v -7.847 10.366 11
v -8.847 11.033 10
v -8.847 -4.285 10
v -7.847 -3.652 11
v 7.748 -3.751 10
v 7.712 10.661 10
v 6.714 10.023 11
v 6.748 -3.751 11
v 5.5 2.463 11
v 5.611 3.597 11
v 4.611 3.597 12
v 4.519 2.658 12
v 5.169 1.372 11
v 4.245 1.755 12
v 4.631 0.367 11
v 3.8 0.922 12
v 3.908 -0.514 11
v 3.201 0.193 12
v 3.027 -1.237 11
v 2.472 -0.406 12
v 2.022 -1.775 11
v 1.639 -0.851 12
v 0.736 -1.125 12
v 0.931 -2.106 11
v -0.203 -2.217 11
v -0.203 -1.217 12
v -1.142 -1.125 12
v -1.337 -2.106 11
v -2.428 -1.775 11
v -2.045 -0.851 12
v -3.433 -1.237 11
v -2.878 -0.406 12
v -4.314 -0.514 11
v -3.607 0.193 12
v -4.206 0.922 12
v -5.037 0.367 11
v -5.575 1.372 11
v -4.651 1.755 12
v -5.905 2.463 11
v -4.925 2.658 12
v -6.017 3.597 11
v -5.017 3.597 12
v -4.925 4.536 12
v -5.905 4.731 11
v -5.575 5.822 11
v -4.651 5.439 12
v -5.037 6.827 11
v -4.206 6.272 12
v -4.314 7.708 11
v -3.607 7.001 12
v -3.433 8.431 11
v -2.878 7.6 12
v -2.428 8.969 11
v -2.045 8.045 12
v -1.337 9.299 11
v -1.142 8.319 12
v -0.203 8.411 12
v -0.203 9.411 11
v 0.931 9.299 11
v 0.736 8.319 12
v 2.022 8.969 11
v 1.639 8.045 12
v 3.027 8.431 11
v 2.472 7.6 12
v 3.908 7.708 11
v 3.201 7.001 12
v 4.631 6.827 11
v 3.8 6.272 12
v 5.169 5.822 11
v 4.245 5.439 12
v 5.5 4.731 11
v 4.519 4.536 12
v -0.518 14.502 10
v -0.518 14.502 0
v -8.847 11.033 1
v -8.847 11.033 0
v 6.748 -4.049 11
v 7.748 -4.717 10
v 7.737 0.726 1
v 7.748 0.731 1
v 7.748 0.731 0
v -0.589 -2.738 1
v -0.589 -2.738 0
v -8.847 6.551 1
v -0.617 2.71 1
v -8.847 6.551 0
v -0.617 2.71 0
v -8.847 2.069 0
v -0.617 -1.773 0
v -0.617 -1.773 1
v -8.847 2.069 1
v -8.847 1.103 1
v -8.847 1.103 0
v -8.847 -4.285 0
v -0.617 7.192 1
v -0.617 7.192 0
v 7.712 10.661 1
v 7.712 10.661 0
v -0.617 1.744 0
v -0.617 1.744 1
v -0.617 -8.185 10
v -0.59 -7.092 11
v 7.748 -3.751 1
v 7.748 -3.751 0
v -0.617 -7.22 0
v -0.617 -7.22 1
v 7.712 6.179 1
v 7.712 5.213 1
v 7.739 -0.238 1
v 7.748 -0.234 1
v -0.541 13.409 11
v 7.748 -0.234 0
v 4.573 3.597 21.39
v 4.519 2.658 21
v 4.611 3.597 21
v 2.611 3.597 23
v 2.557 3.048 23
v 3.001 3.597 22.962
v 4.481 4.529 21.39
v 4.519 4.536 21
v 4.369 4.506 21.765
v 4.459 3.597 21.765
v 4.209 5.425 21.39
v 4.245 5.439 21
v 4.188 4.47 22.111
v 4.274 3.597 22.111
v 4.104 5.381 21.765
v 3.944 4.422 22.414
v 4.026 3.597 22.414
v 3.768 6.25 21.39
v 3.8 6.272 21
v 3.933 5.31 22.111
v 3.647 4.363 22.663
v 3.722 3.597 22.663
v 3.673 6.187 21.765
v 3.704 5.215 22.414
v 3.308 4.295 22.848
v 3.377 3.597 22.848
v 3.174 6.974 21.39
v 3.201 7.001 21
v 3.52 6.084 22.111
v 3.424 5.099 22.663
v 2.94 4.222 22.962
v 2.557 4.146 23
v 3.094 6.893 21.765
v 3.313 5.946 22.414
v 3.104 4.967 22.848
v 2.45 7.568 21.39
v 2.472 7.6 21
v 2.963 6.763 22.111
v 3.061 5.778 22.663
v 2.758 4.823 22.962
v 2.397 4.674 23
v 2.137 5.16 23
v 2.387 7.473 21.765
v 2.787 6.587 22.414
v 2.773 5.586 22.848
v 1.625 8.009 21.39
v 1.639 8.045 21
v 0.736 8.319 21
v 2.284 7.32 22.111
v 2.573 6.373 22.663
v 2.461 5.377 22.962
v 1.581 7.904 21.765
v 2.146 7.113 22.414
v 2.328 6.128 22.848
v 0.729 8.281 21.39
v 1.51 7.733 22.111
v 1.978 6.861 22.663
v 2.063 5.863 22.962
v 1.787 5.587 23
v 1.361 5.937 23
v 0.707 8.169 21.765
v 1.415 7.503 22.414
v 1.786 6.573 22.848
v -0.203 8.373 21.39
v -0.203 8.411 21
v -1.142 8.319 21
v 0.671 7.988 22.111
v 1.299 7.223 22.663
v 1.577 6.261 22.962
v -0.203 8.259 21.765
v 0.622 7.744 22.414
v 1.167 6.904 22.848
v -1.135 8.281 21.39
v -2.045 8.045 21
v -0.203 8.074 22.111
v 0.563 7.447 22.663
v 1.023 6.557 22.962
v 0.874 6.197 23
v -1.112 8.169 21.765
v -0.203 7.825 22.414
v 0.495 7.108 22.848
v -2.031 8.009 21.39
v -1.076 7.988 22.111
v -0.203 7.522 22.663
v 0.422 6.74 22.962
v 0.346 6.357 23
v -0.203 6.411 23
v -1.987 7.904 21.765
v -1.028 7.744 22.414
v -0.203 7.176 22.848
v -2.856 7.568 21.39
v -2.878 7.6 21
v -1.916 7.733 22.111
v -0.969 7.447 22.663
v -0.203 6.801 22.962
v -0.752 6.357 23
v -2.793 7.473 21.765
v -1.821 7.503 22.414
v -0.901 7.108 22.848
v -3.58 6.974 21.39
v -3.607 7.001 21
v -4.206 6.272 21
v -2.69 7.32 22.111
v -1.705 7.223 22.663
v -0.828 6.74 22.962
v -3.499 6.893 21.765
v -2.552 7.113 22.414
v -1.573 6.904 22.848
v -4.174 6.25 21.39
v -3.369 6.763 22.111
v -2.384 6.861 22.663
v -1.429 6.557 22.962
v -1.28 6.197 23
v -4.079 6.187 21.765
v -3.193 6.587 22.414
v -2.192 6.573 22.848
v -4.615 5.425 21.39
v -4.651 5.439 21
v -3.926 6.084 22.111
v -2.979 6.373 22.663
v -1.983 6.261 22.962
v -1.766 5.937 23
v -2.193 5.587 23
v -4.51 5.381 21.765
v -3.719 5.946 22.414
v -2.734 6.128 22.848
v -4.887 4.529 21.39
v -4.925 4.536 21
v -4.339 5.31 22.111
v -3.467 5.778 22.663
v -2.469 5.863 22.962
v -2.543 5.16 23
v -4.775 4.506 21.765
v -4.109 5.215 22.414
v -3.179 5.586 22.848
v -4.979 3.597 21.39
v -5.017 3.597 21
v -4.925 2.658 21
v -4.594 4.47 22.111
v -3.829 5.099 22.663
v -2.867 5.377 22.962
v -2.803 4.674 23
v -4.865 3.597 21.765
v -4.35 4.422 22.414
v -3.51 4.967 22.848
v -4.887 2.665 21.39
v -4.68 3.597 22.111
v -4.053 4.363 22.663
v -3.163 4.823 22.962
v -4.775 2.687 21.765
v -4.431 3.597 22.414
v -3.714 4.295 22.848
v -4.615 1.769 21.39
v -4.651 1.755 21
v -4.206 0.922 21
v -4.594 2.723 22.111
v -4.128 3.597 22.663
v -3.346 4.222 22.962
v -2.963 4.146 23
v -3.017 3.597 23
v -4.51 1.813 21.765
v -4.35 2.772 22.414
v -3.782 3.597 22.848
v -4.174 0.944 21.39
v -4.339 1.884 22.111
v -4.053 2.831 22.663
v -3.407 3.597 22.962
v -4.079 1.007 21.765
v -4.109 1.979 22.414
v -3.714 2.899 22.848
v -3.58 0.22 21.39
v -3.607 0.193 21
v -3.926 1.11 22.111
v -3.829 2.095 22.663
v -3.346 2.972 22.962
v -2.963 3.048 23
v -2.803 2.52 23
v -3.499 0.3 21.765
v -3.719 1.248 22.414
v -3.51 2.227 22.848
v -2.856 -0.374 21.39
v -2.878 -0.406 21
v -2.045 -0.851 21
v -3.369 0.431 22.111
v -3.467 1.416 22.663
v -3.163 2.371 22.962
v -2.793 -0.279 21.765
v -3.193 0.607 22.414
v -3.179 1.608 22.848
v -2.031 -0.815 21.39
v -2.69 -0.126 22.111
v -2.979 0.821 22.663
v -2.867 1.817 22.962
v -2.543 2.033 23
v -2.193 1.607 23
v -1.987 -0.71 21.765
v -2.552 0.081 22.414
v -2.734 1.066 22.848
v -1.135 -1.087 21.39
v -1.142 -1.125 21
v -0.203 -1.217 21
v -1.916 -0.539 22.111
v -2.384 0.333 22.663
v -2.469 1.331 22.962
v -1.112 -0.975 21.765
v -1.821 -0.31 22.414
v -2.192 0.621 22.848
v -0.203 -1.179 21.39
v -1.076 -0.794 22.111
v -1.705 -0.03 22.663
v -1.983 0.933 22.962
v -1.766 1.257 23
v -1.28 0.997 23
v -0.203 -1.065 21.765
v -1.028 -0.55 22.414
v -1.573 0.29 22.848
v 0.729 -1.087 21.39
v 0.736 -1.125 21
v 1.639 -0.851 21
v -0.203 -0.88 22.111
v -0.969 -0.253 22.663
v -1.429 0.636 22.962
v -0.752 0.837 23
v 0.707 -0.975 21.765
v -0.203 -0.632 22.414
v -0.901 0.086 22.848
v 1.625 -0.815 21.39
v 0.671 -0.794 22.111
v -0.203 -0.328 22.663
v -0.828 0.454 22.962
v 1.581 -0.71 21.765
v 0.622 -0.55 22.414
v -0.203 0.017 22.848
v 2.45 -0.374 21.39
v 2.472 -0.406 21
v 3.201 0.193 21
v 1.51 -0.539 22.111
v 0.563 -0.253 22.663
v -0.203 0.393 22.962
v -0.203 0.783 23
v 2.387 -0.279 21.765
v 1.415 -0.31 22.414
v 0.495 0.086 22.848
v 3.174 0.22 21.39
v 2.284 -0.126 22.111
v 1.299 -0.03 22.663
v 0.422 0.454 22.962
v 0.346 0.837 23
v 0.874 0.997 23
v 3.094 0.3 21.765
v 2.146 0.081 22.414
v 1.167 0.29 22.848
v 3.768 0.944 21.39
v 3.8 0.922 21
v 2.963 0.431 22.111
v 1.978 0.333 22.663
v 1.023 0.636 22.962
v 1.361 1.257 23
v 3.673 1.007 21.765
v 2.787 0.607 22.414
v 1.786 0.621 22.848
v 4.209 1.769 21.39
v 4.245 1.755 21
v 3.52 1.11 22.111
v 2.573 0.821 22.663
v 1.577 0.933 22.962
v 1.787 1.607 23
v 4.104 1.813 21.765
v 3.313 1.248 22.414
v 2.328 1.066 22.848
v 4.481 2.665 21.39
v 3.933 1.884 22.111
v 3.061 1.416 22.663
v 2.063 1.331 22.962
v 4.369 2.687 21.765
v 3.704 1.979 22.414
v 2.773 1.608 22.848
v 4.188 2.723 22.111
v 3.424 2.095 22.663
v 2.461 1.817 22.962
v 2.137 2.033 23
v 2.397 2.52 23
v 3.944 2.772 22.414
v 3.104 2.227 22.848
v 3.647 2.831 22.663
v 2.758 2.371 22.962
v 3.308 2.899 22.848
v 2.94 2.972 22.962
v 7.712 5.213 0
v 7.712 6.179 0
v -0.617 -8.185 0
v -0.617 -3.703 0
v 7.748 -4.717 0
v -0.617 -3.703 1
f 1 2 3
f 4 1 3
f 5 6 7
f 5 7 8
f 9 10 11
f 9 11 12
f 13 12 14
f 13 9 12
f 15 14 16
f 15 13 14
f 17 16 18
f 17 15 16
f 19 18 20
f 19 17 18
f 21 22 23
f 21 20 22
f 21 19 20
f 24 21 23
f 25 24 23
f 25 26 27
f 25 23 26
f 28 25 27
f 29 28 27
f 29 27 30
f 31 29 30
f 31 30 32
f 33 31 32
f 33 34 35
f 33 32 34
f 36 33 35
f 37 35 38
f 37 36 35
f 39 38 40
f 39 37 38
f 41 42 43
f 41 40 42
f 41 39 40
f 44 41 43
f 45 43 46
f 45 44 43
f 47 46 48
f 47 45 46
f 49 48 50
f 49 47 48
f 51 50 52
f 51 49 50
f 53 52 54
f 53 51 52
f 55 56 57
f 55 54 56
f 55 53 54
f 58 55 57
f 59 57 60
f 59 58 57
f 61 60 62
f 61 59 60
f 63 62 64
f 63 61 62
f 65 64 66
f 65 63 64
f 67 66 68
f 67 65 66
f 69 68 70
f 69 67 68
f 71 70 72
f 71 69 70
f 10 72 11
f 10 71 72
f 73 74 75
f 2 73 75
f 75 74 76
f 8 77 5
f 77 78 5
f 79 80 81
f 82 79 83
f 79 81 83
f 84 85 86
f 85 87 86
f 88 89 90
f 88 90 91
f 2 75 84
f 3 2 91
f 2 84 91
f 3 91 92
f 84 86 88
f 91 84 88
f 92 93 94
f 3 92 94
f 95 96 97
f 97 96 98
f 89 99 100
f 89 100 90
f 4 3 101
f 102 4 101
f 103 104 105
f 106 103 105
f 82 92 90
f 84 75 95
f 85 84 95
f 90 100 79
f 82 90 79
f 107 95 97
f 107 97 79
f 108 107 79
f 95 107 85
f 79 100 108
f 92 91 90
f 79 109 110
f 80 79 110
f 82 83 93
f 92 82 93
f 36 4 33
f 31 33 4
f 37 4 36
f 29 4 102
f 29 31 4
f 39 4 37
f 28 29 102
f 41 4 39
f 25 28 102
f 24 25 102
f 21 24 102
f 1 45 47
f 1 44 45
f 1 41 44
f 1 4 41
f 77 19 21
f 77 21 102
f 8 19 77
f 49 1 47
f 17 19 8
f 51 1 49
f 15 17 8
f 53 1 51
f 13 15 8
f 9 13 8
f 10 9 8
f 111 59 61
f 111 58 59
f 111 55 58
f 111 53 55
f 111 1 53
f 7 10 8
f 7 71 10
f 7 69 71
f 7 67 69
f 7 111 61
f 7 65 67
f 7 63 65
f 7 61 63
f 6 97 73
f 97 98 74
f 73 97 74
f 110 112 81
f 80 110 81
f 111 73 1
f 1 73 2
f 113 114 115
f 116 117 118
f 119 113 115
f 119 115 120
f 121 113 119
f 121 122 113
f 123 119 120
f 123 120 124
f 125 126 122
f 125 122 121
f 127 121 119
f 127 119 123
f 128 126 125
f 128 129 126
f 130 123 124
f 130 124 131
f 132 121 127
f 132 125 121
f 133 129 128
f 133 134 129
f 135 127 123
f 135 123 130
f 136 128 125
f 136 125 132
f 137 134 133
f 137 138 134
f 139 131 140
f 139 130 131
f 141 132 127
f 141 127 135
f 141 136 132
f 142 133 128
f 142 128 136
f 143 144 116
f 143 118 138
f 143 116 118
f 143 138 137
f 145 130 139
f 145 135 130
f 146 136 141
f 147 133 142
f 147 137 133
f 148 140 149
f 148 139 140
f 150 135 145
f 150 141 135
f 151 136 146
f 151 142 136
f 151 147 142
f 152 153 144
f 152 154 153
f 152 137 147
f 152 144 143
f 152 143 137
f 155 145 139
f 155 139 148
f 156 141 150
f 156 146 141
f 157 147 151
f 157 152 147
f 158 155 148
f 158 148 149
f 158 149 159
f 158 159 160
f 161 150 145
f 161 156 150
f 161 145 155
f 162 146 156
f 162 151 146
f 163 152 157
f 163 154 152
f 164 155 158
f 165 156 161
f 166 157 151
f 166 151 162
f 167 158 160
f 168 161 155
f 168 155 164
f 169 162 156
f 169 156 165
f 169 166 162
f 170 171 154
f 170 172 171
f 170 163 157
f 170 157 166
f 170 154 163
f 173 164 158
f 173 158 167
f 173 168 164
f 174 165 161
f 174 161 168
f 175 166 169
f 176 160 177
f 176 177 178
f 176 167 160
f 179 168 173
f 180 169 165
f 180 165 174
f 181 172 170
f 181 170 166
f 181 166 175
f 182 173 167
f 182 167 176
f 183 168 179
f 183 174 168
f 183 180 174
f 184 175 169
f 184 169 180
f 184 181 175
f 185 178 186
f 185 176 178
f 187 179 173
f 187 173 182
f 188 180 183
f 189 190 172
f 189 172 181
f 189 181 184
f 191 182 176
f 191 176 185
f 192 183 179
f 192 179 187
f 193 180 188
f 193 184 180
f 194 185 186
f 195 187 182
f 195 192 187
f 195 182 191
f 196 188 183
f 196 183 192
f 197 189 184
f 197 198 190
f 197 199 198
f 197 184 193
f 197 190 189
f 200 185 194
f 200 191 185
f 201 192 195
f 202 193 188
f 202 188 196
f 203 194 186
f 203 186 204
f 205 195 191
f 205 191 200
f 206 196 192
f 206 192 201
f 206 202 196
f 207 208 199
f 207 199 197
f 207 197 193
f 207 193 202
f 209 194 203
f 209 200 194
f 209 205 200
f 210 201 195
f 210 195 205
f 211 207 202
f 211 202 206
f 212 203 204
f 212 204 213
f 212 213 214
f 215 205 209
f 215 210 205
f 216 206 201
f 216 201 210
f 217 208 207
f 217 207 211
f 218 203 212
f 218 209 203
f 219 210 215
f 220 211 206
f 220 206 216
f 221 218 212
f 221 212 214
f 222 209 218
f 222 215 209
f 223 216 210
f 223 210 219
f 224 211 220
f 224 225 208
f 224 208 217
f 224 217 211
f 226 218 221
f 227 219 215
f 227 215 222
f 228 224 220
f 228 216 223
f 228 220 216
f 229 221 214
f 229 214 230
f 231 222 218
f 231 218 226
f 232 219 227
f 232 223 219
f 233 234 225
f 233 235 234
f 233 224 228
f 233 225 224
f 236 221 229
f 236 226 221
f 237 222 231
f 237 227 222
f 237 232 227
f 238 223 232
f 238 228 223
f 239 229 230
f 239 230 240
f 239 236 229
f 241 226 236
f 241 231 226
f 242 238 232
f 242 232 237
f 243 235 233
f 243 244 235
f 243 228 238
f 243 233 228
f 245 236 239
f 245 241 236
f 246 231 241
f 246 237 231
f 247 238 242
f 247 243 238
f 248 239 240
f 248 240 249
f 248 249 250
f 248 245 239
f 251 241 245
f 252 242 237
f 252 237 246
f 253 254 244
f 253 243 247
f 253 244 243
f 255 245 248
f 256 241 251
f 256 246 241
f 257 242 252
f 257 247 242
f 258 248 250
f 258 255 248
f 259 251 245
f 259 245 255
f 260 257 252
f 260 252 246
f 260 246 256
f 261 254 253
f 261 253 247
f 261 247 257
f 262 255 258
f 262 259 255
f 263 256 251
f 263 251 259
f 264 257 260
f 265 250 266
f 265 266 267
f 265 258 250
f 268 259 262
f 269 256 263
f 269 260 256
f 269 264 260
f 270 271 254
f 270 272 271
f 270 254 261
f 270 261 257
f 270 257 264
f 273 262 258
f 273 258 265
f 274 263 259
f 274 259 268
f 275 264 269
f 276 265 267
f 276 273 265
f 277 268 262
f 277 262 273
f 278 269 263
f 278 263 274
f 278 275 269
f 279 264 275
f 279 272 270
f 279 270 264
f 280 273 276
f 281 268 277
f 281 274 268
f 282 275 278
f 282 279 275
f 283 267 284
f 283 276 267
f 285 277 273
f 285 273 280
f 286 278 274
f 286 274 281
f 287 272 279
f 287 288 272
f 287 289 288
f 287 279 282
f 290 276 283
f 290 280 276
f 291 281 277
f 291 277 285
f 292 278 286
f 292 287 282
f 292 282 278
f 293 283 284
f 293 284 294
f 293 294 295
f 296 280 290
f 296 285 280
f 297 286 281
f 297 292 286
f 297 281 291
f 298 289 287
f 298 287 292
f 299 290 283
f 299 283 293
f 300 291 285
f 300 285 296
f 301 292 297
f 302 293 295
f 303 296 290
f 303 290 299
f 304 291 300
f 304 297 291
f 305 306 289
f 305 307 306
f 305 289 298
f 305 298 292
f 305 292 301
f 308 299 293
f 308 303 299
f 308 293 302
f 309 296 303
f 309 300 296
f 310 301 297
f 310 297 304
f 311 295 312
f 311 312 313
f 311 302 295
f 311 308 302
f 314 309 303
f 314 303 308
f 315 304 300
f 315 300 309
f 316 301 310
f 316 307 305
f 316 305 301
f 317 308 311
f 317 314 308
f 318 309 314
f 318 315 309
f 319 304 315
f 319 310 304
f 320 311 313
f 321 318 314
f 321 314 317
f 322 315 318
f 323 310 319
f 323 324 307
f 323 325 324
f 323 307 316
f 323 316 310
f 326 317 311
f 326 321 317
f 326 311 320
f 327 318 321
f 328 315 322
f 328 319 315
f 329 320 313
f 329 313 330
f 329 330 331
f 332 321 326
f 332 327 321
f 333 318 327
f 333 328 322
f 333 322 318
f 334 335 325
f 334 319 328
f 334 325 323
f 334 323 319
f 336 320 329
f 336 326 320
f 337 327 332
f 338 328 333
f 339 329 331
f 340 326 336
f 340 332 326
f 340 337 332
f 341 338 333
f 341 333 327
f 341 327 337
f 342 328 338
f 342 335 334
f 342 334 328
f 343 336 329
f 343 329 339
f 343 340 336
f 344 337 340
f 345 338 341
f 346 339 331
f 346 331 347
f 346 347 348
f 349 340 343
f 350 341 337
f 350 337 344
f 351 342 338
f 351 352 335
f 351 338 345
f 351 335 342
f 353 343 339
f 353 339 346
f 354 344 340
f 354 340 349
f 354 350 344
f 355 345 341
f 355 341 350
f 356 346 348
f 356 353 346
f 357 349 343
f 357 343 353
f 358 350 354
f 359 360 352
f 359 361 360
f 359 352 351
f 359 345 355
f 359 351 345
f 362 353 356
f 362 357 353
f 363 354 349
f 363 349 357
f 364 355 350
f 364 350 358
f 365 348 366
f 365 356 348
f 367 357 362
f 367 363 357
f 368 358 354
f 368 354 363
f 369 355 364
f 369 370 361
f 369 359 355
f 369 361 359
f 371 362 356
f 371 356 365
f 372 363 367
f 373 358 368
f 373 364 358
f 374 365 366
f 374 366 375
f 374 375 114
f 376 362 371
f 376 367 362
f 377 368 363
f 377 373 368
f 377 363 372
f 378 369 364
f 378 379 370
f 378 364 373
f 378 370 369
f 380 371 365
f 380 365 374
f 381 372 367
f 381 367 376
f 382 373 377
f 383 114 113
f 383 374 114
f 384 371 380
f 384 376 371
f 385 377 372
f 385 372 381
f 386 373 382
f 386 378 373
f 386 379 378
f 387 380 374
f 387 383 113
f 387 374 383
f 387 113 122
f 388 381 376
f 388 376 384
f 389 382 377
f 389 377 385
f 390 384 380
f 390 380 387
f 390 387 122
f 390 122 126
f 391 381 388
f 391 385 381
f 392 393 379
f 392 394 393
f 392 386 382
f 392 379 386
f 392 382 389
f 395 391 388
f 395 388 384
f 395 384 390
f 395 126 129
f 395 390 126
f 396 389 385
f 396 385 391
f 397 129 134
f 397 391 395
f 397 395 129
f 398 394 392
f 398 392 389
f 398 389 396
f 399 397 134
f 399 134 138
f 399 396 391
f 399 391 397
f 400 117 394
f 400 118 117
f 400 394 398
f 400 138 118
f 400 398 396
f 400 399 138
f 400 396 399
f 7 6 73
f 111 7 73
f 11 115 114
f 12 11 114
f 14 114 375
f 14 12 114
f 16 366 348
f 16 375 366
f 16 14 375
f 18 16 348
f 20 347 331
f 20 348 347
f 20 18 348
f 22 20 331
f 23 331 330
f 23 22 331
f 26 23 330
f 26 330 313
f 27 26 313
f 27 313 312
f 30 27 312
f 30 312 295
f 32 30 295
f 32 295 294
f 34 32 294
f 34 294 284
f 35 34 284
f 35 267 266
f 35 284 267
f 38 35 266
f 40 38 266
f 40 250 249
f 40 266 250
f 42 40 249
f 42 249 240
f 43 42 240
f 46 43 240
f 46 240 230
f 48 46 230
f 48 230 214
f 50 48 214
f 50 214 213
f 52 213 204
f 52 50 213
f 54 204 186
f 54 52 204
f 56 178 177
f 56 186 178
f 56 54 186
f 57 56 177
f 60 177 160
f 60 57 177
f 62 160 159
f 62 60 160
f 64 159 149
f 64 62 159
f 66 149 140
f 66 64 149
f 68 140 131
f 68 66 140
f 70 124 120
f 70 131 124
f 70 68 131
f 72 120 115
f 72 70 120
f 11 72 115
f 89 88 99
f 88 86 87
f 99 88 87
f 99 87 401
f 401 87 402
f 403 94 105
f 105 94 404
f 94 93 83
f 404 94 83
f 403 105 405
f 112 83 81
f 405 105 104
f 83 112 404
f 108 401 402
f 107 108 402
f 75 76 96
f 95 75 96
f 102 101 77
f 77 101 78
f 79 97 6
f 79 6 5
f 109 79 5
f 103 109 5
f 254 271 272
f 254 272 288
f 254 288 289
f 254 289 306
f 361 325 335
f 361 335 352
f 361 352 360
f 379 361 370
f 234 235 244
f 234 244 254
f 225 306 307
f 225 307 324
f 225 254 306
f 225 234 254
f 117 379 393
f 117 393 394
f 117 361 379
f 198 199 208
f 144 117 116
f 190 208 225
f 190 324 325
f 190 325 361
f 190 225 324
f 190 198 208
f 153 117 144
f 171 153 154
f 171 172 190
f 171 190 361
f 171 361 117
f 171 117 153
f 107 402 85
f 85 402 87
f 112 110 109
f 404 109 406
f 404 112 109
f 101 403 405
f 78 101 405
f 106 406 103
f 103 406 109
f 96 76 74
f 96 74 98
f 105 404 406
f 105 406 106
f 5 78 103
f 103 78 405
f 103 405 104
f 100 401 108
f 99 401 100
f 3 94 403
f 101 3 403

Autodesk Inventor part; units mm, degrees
ref_plane "YZ Plane" through (0, 0, 0) normal (1, 0, 0) x (0, 1, 0)
ref_plane "XZ Plane" through (0, 0, 0) normal (0, 1, 0) x (-1, 0, 0)
ref_plane "XY Plane" through (0, 0, 0) normal (0, 0, 1) x (1, 0, 0)
sketch "Sketch1" plane through (0, 0, 0) normal (0, 0, 1) x (1, 0, 0)
  line L0 (7.712, 5.2132) -> (7.712, 6.1786)
  line L1 (7.712, 5.2132) -> (-0.617, 1.7442)
  line L2 (7.712, 6.1786) -> (-0.617, 2.7096)
  line L3 (-0.617, 7.1917) -> (7.712, 10.6607)
  line L4 (7.712, 10.6607) -> (-0.5182, 14.502)
  line L5 (-8.8472, 2.0687) -> (-8.8472, 6.5508)
  line L6 (-8.8472, 11.033) -> (-0.617, 7.1917)
  line L7 (-0.5182, 14.502) -> (-8.8472, 11.033)
  line L8 (-0.617, 2.7096) -> (-8.8472, 6.5508)
  line L9 (7.748, -0.2344) -> (7.748, 0.731)
  line L10 (-0.617, 1.7442) -> (-0.617, -1.7726)
  line L11 (7.748, 0.731) -> (-0.5892, -2.738)
  line L12 (7.748, -0.2344) -> (-0.617, -3.7034)
  line L13 (-0.617, -1.7726) -> (-8.8472, 2.0687)
  line L14 (-0.5892, -2.738) -> (-8.8472, 1.1033)
  line L15 (-8.8472, -4.2851) -> (-8.8472, 1.1033)
  line L16 (7.748, -4.7166) -> (7.748, -3.7512)
  line L17 (7.748, -3.7512) -> (-0.617, -7.2201)
  line L18 (-0.617, -8.1855) -> (7.748, -4.7166)
  line L19 (-0.617, -3.7034) -> (-0.617, -7.2201)
  line L20 (-0.617, -8.1855) -> (-8.8472, -4.2851)
  point P0 (0, 0)
extrude "Extrusion1" add sketch "Sketch1" along normal blind 1
sketch "Sketch2" plane through (0, 0, 1) normal (0, 0, 1) x (1, 0, 0)
  line L0 (-0.617, 7.1917) -> (7.712, 10.6607) projected
  line L1 (7.712, 10.6607) -> (-0.5182, 14.502) projected
  line L2 (-0.5182, 14.502) -> (-8.8472, 11.033) projected
  line L3 (-8.8472, 11.033) -> (-0.617, 7.1917) projected
  line L4 (7.748, -0.2344) -> (7.748, 0.731) projected
  line L5 (7.748, 0.731) -> (-0.5892, -2.738) projected
  line L6 (-0.5892, -2.738) -> (-8.8472, 1.1033) projected
  line L7 (-8.8472, 1.1033) -> (-8.8472, -4.2851) projected
  line L8 (-8.8472, -4.2851) -> (-0.617, -8.1855) projected
  line L9 (-0.617, -8.1855) -> (7.748, -4.7166) projected
  line L10 (7.748, -4.7166) -> (7.748, -3.7512) projected
  line L11 (7.748, -3.7512) -> (-0.617, -7.2201) projected
  line L12 (-0.617, -7.2201) -> (-0.617, -3.7034) projected
  line L13 (-0.617, -3.7034) -> (7.748, -0.2344) projected
  line L14 (-8.8472, 11.033) -> (-8.8472, 1.1033)
  line L15 (7.712, 10.6607) -> (7.748, -3.7512)
  point P0 (0, 0)
extrude "Extrusion2" add sketch "Sketch2" along normal blind 10 contours L3 L2 L1 L0 | L0 L15 L5 L6 L14 L3 | L15 L13 L12 L11 L10 L9 L8 L7 L6 L5 | L15 L11 L12 L13
sketch "Sketch3" plane through (0, 0, 11) normal (0, 0, 1) x (1, 0, 0)
  circle A0 centre (-0.2029, 3.5969) radius 4.8142
  point P0 (0, 0)
extrude "Extrusion3" add sketch "Sketch3" along normal blind 12
fillet "Fillet1" radius 2 1 edges at (-5.0171, 3.5969, 23)
chamfer "Chamfer1" distance 1 angle 45 7 edges at (-8.8472, 3.374, 11) (-4.7321, -6.2353, 11) (3.5655, -6.451, 11) (7.73, 3.4548, 11) (3.5969, 12.5813, 11) (-4.6827, 12.7675, 11) (-5.0171, 3.5969, 11)
properties part number "stamp"
